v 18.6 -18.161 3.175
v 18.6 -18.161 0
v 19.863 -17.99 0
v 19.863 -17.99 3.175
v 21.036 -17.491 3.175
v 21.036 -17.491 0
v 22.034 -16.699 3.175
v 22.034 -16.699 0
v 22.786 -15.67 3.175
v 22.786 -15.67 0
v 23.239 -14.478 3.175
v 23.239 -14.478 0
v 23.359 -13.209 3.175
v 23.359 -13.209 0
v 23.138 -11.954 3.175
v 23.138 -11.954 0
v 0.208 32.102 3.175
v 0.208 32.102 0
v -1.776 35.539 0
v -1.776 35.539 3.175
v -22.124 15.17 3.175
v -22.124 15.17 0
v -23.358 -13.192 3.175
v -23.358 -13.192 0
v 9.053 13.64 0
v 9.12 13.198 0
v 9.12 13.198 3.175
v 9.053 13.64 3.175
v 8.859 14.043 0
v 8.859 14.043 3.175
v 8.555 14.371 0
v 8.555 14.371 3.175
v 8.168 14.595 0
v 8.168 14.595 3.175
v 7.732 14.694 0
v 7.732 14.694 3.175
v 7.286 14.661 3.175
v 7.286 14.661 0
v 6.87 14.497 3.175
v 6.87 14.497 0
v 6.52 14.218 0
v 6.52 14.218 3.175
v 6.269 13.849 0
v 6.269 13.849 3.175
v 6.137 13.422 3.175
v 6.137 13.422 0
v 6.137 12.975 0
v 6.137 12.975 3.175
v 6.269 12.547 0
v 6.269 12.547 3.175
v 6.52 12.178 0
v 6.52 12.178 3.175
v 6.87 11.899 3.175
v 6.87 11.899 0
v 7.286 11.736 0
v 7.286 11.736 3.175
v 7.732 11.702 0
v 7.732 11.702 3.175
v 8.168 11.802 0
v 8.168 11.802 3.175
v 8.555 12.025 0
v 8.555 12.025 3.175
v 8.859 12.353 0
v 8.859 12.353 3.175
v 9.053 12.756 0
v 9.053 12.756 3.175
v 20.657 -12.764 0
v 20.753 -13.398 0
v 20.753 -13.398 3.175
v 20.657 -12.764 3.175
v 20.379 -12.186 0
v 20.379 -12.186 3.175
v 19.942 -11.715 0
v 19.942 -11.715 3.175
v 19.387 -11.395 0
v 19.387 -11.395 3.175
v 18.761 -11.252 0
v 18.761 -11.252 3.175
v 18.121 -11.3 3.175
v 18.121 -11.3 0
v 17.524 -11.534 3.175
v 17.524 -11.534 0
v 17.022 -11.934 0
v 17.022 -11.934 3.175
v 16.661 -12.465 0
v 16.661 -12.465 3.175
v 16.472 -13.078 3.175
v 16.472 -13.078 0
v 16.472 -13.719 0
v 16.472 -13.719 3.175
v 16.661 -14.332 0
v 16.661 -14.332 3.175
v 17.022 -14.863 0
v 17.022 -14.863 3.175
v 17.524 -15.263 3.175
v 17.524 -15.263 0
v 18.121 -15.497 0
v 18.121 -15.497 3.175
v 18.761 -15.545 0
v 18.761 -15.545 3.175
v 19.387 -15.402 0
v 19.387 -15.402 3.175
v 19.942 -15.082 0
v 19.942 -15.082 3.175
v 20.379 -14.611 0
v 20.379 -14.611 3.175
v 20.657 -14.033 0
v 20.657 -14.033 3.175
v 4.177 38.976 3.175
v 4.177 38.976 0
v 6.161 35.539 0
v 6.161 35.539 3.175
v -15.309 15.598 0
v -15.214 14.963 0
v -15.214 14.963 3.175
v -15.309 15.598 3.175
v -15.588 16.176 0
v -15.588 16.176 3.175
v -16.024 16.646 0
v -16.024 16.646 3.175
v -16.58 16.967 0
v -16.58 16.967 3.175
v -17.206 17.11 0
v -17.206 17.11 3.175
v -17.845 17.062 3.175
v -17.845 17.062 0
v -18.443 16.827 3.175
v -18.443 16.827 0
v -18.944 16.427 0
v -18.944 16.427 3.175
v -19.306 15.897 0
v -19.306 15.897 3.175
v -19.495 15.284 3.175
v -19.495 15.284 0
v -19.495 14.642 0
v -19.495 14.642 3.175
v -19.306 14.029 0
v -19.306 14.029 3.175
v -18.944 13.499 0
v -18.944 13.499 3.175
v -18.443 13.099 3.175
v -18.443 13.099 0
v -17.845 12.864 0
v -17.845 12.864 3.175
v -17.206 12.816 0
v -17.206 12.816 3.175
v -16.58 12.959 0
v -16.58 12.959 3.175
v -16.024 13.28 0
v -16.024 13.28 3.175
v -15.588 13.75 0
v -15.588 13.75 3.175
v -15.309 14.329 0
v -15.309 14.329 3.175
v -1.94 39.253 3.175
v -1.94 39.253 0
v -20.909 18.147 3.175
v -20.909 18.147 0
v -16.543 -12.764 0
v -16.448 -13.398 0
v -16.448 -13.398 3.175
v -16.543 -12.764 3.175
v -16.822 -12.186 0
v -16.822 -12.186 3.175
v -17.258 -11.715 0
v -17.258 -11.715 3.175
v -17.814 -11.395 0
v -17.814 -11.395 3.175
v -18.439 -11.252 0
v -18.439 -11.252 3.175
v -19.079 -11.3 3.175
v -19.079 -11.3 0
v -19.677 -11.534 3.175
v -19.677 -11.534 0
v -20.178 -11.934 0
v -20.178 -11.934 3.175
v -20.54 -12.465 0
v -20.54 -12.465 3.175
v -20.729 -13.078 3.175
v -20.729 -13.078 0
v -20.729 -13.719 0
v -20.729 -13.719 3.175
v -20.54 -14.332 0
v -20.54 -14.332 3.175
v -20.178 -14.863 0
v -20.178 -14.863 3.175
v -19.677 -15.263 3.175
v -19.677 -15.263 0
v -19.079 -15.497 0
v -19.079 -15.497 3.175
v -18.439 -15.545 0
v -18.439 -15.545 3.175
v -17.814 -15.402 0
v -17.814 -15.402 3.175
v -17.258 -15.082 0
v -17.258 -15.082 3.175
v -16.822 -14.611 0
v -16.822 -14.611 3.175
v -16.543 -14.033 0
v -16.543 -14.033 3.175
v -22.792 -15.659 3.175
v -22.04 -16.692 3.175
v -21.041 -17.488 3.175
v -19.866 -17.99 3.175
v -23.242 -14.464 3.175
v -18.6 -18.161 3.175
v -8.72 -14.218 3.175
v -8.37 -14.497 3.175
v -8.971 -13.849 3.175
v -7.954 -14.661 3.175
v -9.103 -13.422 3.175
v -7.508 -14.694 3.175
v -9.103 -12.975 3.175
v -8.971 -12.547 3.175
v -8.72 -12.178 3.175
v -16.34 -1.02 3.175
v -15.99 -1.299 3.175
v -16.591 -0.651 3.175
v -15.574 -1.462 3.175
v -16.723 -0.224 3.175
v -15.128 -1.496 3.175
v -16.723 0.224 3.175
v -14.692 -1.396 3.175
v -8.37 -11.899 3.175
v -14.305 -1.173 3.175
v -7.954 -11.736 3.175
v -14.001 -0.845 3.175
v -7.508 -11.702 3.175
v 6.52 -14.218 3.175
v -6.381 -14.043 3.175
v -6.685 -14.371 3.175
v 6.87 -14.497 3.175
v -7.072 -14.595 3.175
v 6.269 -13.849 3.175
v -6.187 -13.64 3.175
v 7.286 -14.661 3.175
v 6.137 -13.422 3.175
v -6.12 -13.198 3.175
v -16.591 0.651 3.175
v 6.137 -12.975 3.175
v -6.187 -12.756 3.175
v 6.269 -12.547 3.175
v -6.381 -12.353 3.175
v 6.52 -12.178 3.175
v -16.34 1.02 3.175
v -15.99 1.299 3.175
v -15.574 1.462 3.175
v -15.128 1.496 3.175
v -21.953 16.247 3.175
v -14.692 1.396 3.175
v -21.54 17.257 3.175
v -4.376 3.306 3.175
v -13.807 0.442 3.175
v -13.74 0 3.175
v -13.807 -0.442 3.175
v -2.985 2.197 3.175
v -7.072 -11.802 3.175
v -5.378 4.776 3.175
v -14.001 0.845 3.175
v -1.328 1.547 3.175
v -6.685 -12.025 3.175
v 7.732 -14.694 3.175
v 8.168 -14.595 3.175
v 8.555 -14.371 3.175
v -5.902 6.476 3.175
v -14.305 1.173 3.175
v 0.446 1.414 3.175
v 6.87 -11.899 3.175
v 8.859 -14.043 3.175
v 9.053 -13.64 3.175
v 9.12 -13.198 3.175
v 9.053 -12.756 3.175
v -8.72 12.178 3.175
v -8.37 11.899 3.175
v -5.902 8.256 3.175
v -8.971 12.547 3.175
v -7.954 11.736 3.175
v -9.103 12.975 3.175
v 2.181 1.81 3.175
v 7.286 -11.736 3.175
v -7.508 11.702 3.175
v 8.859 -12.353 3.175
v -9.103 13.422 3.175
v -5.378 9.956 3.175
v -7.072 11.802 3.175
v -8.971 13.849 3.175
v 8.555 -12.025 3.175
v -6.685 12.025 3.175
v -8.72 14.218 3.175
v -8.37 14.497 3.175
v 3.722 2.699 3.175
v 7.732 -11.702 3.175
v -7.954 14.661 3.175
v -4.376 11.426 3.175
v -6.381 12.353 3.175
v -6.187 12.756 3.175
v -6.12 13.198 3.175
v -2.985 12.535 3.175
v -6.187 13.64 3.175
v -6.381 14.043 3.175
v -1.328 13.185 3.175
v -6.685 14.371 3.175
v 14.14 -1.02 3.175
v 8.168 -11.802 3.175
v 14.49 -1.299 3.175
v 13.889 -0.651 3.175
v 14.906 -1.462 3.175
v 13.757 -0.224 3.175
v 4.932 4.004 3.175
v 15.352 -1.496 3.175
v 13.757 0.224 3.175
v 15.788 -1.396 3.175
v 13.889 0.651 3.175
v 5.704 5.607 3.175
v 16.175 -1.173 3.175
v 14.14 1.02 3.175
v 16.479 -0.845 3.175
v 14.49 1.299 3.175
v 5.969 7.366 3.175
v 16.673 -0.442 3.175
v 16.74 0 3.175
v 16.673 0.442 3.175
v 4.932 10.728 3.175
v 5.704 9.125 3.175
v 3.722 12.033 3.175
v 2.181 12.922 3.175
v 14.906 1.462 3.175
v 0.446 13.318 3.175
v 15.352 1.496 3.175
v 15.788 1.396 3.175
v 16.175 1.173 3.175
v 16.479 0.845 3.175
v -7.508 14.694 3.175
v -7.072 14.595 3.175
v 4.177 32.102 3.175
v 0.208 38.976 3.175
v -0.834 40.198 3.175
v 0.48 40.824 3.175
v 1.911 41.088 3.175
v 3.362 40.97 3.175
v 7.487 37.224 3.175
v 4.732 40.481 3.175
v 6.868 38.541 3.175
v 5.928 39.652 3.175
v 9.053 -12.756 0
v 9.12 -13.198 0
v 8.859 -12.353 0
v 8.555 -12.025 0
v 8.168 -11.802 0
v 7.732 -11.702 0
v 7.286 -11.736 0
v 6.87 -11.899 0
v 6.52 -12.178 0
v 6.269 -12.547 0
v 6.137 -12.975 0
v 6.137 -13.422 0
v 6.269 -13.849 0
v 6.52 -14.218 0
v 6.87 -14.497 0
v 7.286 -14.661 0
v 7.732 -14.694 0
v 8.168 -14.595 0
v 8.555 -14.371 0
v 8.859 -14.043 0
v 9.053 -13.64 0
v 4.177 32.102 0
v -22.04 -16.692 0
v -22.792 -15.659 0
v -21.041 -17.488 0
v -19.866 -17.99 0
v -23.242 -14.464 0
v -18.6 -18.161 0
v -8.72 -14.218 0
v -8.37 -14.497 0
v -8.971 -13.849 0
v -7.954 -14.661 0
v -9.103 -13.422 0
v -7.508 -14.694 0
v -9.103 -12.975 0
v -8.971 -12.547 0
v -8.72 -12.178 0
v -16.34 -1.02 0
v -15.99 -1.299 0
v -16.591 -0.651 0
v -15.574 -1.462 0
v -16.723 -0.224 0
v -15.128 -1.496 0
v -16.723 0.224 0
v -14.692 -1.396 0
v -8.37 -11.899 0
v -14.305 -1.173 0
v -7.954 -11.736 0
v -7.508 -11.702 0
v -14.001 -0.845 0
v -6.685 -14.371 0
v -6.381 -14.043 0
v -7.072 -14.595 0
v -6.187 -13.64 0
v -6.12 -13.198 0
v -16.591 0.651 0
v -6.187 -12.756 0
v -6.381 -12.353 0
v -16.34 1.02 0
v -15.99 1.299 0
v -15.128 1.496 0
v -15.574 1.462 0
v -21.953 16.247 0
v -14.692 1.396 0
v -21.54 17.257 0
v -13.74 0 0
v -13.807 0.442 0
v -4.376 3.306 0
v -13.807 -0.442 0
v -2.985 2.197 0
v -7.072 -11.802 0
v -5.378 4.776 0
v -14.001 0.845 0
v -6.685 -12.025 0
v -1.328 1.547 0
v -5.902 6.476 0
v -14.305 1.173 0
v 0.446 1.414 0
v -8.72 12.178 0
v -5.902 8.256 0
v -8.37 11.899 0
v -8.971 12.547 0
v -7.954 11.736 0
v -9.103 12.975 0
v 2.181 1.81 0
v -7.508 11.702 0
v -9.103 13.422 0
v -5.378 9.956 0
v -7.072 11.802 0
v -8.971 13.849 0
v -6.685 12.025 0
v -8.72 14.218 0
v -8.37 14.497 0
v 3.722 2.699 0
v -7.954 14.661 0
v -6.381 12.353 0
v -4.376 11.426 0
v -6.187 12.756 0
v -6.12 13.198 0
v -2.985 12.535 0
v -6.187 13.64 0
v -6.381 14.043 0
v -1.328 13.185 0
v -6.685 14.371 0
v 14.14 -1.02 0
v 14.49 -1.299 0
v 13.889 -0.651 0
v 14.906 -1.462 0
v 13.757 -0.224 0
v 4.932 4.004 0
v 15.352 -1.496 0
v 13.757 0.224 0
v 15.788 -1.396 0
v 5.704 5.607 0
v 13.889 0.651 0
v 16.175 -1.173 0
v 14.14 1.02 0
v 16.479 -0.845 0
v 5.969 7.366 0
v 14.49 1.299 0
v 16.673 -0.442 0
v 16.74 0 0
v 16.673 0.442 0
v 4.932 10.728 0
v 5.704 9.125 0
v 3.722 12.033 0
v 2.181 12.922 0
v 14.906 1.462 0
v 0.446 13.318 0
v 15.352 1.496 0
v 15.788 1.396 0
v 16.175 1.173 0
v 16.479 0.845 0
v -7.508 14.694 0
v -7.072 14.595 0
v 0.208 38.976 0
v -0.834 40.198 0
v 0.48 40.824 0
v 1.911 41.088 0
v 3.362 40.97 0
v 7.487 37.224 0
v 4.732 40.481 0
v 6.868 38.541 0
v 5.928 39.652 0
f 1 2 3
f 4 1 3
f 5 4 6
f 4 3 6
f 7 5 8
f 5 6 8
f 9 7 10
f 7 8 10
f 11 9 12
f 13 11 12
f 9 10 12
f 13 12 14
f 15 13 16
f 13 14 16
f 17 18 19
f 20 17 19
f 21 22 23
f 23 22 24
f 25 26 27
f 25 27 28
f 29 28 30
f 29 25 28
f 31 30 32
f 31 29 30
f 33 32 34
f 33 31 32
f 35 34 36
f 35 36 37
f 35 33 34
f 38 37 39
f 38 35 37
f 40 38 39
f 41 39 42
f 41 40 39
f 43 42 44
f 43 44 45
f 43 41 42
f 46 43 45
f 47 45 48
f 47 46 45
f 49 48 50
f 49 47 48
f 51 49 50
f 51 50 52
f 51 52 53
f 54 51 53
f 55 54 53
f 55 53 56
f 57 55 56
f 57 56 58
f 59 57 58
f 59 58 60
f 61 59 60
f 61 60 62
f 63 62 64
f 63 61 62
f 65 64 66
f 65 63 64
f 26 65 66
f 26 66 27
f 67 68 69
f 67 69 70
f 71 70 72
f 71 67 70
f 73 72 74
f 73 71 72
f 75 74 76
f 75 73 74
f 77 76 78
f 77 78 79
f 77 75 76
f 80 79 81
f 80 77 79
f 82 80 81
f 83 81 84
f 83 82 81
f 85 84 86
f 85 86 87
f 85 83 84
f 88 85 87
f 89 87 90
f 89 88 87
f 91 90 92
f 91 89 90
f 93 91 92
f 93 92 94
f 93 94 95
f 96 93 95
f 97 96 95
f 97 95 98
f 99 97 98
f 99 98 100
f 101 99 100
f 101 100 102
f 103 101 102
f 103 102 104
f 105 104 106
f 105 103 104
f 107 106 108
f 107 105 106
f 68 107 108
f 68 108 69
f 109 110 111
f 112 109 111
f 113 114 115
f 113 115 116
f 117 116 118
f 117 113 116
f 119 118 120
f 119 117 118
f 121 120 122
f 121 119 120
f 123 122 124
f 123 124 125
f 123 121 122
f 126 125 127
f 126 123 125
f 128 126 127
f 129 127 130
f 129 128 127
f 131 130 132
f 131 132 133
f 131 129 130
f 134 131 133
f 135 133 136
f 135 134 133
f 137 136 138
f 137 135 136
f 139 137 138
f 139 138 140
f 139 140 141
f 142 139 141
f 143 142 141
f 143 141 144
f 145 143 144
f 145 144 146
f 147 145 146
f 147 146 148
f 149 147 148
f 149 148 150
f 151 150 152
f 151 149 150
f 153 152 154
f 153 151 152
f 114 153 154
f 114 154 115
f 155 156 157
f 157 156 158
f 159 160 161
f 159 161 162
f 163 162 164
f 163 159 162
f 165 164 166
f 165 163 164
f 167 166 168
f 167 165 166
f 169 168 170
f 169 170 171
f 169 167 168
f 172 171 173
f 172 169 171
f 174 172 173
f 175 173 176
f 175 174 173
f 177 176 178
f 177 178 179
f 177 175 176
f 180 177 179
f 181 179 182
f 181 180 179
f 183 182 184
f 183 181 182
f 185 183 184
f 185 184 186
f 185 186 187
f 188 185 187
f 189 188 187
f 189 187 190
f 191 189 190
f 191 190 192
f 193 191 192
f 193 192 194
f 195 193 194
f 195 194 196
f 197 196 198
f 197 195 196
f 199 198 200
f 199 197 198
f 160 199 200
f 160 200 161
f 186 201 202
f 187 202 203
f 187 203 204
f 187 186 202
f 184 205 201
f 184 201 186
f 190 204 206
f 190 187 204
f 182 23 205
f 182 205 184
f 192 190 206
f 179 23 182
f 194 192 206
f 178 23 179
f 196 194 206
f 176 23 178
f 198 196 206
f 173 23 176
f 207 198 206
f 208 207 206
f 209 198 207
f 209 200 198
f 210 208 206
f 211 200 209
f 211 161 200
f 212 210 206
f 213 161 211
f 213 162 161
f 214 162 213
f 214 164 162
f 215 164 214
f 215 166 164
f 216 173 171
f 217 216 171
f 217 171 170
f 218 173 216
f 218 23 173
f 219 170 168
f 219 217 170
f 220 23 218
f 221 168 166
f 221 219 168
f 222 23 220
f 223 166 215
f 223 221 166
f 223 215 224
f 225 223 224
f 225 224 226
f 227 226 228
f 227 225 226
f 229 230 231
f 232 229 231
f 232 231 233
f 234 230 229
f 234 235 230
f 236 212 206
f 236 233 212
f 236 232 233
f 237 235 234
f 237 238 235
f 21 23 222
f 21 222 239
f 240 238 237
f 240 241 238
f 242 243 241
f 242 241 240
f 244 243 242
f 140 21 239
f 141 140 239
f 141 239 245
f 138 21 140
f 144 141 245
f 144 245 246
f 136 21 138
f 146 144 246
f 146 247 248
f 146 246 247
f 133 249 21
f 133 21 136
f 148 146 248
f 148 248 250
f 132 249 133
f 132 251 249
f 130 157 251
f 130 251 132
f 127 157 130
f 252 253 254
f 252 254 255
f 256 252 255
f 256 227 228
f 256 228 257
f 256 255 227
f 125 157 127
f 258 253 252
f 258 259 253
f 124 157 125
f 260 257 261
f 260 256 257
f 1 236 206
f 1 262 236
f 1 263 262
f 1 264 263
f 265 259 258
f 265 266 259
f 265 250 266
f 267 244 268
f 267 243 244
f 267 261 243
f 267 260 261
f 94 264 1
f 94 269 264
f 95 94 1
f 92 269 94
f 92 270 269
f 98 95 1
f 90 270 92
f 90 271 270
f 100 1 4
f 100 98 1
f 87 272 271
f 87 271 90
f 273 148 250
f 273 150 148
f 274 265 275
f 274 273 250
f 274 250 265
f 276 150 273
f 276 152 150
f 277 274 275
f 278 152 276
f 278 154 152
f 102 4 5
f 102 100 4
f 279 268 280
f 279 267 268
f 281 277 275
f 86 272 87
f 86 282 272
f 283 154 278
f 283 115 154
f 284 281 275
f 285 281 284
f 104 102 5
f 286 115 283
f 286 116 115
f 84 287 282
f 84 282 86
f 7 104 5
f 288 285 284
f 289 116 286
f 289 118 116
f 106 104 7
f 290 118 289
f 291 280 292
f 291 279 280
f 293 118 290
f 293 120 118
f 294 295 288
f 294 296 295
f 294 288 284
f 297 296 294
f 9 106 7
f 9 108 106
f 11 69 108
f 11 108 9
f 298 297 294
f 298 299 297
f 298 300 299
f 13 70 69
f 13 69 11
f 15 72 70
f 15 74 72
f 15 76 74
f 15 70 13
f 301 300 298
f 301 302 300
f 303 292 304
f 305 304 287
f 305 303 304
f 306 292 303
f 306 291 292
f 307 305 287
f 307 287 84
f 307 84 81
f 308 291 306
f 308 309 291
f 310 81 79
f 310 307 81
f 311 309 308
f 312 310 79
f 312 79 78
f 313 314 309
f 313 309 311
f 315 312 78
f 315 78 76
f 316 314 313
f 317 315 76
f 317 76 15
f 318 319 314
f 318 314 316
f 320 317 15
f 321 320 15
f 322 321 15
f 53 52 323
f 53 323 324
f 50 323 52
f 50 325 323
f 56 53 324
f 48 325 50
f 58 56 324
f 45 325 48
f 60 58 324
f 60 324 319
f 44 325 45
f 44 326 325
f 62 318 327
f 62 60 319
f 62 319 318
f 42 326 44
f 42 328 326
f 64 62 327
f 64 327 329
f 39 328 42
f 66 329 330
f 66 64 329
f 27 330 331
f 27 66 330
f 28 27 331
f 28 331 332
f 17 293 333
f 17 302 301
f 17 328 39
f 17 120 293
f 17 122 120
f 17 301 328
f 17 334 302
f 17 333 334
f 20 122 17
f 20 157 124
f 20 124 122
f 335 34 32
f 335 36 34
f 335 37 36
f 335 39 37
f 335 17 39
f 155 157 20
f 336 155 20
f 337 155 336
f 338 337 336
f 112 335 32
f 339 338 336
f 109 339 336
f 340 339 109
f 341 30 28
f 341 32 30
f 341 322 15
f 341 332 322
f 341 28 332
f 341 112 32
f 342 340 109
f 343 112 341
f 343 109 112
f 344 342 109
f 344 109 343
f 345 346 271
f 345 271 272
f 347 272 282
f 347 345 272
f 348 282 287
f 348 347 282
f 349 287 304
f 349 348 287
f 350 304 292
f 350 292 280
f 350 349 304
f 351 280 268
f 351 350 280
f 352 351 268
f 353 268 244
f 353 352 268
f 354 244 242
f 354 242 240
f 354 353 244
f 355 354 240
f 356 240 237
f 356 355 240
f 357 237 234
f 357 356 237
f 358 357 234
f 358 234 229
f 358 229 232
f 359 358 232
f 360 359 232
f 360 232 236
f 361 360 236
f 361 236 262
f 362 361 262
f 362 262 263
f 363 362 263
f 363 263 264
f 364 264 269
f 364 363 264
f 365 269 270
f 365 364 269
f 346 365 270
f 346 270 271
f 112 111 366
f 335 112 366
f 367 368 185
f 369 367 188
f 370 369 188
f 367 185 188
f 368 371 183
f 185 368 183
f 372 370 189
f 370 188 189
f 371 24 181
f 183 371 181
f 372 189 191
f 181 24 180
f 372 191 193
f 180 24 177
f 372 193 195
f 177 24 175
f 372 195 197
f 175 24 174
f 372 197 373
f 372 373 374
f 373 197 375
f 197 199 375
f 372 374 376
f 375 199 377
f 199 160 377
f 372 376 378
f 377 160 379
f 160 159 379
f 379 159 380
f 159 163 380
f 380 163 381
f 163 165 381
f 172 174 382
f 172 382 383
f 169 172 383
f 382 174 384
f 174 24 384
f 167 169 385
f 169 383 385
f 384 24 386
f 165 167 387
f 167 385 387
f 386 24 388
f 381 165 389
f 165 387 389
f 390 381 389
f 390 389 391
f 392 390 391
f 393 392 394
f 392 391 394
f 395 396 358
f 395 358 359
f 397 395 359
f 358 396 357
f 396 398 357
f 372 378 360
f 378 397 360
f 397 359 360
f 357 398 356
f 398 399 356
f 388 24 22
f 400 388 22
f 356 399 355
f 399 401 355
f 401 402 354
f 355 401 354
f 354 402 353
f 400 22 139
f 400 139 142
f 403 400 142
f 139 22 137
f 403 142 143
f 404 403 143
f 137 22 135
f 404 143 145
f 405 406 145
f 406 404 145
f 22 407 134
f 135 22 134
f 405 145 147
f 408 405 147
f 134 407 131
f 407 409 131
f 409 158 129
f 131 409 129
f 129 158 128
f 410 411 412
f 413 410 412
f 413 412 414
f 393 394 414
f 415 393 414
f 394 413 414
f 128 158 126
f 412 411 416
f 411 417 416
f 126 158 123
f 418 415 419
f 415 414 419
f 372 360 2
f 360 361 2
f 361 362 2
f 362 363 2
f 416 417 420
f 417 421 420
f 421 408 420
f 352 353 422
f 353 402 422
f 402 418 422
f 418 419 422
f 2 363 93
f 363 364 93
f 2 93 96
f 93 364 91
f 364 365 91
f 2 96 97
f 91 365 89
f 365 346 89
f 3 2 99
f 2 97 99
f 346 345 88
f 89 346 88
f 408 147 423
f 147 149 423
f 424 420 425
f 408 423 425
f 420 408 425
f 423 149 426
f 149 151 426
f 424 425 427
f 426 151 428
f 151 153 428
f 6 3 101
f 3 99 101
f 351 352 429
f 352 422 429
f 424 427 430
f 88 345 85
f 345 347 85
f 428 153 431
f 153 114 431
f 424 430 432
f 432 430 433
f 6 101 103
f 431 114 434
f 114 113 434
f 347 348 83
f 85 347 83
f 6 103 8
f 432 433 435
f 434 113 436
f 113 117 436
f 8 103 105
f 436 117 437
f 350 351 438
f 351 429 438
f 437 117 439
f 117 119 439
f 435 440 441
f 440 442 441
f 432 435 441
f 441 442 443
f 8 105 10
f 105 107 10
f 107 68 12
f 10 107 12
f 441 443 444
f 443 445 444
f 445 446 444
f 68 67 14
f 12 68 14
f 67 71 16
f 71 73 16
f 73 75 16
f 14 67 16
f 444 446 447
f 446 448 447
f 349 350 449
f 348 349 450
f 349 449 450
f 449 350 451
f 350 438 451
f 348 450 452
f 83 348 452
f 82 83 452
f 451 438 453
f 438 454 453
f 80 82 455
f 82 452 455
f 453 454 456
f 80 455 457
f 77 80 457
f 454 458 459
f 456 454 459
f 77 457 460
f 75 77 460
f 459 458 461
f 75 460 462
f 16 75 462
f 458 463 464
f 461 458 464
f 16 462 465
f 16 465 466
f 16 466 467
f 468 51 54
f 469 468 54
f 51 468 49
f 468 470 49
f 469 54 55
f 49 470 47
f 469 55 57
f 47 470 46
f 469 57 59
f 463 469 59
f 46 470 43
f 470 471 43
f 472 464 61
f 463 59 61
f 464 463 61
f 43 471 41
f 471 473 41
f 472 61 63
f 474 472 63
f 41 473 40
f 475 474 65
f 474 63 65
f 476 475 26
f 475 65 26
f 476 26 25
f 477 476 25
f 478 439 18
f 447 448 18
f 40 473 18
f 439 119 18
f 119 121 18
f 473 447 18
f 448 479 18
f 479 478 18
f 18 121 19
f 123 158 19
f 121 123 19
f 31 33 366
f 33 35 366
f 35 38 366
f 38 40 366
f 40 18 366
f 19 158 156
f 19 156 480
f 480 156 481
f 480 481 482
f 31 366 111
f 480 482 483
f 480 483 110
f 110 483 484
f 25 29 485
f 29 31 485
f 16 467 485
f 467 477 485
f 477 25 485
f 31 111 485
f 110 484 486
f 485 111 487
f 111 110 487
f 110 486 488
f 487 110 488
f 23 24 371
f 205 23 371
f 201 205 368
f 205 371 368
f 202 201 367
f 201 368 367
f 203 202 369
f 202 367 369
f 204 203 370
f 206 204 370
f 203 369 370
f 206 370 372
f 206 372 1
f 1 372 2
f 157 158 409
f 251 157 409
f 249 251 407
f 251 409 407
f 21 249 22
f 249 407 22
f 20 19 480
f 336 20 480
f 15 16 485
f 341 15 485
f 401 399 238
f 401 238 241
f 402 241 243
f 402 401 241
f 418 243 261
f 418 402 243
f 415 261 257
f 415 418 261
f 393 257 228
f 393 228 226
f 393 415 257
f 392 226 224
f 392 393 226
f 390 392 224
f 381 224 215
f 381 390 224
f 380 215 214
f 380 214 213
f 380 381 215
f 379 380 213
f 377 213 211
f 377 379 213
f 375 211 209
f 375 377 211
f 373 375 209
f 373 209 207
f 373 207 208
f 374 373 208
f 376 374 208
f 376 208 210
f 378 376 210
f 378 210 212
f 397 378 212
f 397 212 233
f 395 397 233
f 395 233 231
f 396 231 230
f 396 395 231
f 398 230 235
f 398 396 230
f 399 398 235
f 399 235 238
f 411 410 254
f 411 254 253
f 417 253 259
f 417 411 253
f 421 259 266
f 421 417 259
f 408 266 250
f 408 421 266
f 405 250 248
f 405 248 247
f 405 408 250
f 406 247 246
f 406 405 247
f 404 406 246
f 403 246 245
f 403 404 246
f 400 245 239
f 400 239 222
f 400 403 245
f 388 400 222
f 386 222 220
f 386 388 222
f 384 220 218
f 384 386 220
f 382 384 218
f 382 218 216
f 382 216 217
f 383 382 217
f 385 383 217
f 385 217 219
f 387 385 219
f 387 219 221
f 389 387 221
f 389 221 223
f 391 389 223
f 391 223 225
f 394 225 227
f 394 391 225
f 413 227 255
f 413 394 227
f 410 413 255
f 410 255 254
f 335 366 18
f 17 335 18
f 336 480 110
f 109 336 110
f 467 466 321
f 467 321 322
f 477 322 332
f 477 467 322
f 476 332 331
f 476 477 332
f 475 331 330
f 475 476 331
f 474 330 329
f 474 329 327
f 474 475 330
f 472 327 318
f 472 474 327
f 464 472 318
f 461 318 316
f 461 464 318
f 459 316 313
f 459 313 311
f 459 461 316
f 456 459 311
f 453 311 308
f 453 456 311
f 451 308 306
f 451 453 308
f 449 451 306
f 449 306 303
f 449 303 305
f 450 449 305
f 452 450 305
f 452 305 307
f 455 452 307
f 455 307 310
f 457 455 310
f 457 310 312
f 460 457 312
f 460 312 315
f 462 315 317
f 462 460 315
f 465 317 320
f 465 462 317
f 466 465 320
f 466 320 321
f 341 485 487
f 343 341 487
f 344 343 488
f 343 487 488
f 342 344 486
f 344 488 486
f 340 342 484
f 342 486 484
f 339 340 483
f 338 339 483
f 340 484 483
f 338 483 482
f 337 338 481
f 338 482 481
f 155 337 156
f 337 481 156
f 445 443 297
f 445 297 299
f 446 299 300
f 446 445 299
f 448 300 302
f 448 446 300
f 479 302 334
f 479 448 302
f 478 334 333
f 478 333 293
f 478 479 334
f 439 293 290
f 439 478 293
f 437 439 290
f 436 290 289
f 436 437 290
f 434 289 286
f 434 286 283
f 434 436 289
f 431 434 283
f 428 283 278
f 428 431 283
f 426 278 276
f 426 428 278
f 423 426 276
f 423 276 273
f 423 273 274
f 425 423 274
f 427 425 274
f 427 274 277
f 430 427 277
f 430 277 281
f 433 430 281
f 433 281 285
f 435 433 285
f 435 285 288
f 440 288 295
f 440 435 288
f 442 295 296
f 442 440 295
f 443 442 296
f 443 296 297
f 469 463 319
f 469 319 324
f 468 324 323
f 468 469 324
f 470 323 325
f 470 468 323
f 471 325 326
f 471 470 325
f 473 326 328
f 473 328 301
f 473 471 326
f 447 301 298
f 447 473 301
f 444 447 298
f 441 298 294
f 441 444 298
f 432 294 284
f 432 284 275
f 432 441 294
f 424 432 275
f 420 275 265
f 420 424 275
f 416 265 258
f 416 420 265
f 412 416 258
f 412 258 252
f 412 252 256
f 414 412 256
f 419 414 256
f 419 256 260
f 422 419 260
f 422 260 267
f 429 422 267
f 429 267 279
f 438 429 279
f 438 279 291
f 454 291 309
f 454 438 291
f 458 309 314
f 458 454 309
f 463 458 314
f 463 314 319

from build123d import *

# Parameters (mm, degrees)
F0_R     = 2.15265
F0_R_2   = 1.5
F0_R_3   = 5.969
F1_DEPTH = 3.175


with BuildPart() as f1:
    # F0 (on Top) → F1 (new body)
    with BuildSketch(Plane.XY):
        with BuildLine():
            ThreePointArc((18.600191, -18.161), (22.444669, -16.209442), (23.138398, -11.954172))
            Line((23.138398, -11.954172), (7.487077, 37.223663))
            ThreePointArc((7.487077, 37.223663), (3.361586, 40.970478), (-1.940047, 39.252633))
            Line((-1.940047, 39.252633), (-20.908597, 18.146535))
            ThreePointArc((-20.908597, 18.146535), (-21.775278, 16.764006), (-22.124412, 15.170071))
            Line((-22.124412, 15.170071), (-23.358191, -13.191519))
            ThreePointArc((-23.358191, -13.191519), (-22.040188, -16.692104), (-18.600191, -18.161))
            Line((-18.600191, -18.161), (18.600191, -18.161))
        make_face()
        with Locations((-18.600191, -13.3985)):
            Circle(F0_R, mode=Mode.SUBTRACT)
        with Locations((-7.62, -13.198227)):
            Circle(F0_R_2, mode=Mode.SUBTRACT)
        with Locations((-15.24, 0)):
            Circle(F0_R_2, mode=Mode.SUBTRACT)
        with Locations((7.62, -13.198227)):
            Circle(F0_R_2, mode=Mode.SUBTRACT)
        with Locations((18.600191, -13.3985)):
            Circle(F0_R, mode=Mode.SUBTRACT)
        with Locations((0, 7.366)):
            Circle(F0_R_3, mode=Mode.SUBTRACT)
        with Locations((15.24, 0)):
            Circle(F0_R_2, mode=Mode.SUBTRACT)
        with Locations((-17.366412, 14.963089)):
            Circle(F0_R, mode=Mode.SUBTRACT)
        with Locations((-7.62, 13.198227)):
            Circle(F0_R_2, mode=Mode.SUBTRACT)
        with Locations((7.62, 13.198227)):
            Circle(F0_R_2, mode=Mode.SUBTRACT)
        Polygon((6.161253, 35.538613), (4.176878, 32.101575), (0.208128, 32.101575), (-1.776247, 35.538613), (0.208128, 38.975652), (4.176878, 38.975652), align=None, mode=Mode.SUBTRACT)
    extrude(amount=F1_DEPTH)


solid = f1.part
